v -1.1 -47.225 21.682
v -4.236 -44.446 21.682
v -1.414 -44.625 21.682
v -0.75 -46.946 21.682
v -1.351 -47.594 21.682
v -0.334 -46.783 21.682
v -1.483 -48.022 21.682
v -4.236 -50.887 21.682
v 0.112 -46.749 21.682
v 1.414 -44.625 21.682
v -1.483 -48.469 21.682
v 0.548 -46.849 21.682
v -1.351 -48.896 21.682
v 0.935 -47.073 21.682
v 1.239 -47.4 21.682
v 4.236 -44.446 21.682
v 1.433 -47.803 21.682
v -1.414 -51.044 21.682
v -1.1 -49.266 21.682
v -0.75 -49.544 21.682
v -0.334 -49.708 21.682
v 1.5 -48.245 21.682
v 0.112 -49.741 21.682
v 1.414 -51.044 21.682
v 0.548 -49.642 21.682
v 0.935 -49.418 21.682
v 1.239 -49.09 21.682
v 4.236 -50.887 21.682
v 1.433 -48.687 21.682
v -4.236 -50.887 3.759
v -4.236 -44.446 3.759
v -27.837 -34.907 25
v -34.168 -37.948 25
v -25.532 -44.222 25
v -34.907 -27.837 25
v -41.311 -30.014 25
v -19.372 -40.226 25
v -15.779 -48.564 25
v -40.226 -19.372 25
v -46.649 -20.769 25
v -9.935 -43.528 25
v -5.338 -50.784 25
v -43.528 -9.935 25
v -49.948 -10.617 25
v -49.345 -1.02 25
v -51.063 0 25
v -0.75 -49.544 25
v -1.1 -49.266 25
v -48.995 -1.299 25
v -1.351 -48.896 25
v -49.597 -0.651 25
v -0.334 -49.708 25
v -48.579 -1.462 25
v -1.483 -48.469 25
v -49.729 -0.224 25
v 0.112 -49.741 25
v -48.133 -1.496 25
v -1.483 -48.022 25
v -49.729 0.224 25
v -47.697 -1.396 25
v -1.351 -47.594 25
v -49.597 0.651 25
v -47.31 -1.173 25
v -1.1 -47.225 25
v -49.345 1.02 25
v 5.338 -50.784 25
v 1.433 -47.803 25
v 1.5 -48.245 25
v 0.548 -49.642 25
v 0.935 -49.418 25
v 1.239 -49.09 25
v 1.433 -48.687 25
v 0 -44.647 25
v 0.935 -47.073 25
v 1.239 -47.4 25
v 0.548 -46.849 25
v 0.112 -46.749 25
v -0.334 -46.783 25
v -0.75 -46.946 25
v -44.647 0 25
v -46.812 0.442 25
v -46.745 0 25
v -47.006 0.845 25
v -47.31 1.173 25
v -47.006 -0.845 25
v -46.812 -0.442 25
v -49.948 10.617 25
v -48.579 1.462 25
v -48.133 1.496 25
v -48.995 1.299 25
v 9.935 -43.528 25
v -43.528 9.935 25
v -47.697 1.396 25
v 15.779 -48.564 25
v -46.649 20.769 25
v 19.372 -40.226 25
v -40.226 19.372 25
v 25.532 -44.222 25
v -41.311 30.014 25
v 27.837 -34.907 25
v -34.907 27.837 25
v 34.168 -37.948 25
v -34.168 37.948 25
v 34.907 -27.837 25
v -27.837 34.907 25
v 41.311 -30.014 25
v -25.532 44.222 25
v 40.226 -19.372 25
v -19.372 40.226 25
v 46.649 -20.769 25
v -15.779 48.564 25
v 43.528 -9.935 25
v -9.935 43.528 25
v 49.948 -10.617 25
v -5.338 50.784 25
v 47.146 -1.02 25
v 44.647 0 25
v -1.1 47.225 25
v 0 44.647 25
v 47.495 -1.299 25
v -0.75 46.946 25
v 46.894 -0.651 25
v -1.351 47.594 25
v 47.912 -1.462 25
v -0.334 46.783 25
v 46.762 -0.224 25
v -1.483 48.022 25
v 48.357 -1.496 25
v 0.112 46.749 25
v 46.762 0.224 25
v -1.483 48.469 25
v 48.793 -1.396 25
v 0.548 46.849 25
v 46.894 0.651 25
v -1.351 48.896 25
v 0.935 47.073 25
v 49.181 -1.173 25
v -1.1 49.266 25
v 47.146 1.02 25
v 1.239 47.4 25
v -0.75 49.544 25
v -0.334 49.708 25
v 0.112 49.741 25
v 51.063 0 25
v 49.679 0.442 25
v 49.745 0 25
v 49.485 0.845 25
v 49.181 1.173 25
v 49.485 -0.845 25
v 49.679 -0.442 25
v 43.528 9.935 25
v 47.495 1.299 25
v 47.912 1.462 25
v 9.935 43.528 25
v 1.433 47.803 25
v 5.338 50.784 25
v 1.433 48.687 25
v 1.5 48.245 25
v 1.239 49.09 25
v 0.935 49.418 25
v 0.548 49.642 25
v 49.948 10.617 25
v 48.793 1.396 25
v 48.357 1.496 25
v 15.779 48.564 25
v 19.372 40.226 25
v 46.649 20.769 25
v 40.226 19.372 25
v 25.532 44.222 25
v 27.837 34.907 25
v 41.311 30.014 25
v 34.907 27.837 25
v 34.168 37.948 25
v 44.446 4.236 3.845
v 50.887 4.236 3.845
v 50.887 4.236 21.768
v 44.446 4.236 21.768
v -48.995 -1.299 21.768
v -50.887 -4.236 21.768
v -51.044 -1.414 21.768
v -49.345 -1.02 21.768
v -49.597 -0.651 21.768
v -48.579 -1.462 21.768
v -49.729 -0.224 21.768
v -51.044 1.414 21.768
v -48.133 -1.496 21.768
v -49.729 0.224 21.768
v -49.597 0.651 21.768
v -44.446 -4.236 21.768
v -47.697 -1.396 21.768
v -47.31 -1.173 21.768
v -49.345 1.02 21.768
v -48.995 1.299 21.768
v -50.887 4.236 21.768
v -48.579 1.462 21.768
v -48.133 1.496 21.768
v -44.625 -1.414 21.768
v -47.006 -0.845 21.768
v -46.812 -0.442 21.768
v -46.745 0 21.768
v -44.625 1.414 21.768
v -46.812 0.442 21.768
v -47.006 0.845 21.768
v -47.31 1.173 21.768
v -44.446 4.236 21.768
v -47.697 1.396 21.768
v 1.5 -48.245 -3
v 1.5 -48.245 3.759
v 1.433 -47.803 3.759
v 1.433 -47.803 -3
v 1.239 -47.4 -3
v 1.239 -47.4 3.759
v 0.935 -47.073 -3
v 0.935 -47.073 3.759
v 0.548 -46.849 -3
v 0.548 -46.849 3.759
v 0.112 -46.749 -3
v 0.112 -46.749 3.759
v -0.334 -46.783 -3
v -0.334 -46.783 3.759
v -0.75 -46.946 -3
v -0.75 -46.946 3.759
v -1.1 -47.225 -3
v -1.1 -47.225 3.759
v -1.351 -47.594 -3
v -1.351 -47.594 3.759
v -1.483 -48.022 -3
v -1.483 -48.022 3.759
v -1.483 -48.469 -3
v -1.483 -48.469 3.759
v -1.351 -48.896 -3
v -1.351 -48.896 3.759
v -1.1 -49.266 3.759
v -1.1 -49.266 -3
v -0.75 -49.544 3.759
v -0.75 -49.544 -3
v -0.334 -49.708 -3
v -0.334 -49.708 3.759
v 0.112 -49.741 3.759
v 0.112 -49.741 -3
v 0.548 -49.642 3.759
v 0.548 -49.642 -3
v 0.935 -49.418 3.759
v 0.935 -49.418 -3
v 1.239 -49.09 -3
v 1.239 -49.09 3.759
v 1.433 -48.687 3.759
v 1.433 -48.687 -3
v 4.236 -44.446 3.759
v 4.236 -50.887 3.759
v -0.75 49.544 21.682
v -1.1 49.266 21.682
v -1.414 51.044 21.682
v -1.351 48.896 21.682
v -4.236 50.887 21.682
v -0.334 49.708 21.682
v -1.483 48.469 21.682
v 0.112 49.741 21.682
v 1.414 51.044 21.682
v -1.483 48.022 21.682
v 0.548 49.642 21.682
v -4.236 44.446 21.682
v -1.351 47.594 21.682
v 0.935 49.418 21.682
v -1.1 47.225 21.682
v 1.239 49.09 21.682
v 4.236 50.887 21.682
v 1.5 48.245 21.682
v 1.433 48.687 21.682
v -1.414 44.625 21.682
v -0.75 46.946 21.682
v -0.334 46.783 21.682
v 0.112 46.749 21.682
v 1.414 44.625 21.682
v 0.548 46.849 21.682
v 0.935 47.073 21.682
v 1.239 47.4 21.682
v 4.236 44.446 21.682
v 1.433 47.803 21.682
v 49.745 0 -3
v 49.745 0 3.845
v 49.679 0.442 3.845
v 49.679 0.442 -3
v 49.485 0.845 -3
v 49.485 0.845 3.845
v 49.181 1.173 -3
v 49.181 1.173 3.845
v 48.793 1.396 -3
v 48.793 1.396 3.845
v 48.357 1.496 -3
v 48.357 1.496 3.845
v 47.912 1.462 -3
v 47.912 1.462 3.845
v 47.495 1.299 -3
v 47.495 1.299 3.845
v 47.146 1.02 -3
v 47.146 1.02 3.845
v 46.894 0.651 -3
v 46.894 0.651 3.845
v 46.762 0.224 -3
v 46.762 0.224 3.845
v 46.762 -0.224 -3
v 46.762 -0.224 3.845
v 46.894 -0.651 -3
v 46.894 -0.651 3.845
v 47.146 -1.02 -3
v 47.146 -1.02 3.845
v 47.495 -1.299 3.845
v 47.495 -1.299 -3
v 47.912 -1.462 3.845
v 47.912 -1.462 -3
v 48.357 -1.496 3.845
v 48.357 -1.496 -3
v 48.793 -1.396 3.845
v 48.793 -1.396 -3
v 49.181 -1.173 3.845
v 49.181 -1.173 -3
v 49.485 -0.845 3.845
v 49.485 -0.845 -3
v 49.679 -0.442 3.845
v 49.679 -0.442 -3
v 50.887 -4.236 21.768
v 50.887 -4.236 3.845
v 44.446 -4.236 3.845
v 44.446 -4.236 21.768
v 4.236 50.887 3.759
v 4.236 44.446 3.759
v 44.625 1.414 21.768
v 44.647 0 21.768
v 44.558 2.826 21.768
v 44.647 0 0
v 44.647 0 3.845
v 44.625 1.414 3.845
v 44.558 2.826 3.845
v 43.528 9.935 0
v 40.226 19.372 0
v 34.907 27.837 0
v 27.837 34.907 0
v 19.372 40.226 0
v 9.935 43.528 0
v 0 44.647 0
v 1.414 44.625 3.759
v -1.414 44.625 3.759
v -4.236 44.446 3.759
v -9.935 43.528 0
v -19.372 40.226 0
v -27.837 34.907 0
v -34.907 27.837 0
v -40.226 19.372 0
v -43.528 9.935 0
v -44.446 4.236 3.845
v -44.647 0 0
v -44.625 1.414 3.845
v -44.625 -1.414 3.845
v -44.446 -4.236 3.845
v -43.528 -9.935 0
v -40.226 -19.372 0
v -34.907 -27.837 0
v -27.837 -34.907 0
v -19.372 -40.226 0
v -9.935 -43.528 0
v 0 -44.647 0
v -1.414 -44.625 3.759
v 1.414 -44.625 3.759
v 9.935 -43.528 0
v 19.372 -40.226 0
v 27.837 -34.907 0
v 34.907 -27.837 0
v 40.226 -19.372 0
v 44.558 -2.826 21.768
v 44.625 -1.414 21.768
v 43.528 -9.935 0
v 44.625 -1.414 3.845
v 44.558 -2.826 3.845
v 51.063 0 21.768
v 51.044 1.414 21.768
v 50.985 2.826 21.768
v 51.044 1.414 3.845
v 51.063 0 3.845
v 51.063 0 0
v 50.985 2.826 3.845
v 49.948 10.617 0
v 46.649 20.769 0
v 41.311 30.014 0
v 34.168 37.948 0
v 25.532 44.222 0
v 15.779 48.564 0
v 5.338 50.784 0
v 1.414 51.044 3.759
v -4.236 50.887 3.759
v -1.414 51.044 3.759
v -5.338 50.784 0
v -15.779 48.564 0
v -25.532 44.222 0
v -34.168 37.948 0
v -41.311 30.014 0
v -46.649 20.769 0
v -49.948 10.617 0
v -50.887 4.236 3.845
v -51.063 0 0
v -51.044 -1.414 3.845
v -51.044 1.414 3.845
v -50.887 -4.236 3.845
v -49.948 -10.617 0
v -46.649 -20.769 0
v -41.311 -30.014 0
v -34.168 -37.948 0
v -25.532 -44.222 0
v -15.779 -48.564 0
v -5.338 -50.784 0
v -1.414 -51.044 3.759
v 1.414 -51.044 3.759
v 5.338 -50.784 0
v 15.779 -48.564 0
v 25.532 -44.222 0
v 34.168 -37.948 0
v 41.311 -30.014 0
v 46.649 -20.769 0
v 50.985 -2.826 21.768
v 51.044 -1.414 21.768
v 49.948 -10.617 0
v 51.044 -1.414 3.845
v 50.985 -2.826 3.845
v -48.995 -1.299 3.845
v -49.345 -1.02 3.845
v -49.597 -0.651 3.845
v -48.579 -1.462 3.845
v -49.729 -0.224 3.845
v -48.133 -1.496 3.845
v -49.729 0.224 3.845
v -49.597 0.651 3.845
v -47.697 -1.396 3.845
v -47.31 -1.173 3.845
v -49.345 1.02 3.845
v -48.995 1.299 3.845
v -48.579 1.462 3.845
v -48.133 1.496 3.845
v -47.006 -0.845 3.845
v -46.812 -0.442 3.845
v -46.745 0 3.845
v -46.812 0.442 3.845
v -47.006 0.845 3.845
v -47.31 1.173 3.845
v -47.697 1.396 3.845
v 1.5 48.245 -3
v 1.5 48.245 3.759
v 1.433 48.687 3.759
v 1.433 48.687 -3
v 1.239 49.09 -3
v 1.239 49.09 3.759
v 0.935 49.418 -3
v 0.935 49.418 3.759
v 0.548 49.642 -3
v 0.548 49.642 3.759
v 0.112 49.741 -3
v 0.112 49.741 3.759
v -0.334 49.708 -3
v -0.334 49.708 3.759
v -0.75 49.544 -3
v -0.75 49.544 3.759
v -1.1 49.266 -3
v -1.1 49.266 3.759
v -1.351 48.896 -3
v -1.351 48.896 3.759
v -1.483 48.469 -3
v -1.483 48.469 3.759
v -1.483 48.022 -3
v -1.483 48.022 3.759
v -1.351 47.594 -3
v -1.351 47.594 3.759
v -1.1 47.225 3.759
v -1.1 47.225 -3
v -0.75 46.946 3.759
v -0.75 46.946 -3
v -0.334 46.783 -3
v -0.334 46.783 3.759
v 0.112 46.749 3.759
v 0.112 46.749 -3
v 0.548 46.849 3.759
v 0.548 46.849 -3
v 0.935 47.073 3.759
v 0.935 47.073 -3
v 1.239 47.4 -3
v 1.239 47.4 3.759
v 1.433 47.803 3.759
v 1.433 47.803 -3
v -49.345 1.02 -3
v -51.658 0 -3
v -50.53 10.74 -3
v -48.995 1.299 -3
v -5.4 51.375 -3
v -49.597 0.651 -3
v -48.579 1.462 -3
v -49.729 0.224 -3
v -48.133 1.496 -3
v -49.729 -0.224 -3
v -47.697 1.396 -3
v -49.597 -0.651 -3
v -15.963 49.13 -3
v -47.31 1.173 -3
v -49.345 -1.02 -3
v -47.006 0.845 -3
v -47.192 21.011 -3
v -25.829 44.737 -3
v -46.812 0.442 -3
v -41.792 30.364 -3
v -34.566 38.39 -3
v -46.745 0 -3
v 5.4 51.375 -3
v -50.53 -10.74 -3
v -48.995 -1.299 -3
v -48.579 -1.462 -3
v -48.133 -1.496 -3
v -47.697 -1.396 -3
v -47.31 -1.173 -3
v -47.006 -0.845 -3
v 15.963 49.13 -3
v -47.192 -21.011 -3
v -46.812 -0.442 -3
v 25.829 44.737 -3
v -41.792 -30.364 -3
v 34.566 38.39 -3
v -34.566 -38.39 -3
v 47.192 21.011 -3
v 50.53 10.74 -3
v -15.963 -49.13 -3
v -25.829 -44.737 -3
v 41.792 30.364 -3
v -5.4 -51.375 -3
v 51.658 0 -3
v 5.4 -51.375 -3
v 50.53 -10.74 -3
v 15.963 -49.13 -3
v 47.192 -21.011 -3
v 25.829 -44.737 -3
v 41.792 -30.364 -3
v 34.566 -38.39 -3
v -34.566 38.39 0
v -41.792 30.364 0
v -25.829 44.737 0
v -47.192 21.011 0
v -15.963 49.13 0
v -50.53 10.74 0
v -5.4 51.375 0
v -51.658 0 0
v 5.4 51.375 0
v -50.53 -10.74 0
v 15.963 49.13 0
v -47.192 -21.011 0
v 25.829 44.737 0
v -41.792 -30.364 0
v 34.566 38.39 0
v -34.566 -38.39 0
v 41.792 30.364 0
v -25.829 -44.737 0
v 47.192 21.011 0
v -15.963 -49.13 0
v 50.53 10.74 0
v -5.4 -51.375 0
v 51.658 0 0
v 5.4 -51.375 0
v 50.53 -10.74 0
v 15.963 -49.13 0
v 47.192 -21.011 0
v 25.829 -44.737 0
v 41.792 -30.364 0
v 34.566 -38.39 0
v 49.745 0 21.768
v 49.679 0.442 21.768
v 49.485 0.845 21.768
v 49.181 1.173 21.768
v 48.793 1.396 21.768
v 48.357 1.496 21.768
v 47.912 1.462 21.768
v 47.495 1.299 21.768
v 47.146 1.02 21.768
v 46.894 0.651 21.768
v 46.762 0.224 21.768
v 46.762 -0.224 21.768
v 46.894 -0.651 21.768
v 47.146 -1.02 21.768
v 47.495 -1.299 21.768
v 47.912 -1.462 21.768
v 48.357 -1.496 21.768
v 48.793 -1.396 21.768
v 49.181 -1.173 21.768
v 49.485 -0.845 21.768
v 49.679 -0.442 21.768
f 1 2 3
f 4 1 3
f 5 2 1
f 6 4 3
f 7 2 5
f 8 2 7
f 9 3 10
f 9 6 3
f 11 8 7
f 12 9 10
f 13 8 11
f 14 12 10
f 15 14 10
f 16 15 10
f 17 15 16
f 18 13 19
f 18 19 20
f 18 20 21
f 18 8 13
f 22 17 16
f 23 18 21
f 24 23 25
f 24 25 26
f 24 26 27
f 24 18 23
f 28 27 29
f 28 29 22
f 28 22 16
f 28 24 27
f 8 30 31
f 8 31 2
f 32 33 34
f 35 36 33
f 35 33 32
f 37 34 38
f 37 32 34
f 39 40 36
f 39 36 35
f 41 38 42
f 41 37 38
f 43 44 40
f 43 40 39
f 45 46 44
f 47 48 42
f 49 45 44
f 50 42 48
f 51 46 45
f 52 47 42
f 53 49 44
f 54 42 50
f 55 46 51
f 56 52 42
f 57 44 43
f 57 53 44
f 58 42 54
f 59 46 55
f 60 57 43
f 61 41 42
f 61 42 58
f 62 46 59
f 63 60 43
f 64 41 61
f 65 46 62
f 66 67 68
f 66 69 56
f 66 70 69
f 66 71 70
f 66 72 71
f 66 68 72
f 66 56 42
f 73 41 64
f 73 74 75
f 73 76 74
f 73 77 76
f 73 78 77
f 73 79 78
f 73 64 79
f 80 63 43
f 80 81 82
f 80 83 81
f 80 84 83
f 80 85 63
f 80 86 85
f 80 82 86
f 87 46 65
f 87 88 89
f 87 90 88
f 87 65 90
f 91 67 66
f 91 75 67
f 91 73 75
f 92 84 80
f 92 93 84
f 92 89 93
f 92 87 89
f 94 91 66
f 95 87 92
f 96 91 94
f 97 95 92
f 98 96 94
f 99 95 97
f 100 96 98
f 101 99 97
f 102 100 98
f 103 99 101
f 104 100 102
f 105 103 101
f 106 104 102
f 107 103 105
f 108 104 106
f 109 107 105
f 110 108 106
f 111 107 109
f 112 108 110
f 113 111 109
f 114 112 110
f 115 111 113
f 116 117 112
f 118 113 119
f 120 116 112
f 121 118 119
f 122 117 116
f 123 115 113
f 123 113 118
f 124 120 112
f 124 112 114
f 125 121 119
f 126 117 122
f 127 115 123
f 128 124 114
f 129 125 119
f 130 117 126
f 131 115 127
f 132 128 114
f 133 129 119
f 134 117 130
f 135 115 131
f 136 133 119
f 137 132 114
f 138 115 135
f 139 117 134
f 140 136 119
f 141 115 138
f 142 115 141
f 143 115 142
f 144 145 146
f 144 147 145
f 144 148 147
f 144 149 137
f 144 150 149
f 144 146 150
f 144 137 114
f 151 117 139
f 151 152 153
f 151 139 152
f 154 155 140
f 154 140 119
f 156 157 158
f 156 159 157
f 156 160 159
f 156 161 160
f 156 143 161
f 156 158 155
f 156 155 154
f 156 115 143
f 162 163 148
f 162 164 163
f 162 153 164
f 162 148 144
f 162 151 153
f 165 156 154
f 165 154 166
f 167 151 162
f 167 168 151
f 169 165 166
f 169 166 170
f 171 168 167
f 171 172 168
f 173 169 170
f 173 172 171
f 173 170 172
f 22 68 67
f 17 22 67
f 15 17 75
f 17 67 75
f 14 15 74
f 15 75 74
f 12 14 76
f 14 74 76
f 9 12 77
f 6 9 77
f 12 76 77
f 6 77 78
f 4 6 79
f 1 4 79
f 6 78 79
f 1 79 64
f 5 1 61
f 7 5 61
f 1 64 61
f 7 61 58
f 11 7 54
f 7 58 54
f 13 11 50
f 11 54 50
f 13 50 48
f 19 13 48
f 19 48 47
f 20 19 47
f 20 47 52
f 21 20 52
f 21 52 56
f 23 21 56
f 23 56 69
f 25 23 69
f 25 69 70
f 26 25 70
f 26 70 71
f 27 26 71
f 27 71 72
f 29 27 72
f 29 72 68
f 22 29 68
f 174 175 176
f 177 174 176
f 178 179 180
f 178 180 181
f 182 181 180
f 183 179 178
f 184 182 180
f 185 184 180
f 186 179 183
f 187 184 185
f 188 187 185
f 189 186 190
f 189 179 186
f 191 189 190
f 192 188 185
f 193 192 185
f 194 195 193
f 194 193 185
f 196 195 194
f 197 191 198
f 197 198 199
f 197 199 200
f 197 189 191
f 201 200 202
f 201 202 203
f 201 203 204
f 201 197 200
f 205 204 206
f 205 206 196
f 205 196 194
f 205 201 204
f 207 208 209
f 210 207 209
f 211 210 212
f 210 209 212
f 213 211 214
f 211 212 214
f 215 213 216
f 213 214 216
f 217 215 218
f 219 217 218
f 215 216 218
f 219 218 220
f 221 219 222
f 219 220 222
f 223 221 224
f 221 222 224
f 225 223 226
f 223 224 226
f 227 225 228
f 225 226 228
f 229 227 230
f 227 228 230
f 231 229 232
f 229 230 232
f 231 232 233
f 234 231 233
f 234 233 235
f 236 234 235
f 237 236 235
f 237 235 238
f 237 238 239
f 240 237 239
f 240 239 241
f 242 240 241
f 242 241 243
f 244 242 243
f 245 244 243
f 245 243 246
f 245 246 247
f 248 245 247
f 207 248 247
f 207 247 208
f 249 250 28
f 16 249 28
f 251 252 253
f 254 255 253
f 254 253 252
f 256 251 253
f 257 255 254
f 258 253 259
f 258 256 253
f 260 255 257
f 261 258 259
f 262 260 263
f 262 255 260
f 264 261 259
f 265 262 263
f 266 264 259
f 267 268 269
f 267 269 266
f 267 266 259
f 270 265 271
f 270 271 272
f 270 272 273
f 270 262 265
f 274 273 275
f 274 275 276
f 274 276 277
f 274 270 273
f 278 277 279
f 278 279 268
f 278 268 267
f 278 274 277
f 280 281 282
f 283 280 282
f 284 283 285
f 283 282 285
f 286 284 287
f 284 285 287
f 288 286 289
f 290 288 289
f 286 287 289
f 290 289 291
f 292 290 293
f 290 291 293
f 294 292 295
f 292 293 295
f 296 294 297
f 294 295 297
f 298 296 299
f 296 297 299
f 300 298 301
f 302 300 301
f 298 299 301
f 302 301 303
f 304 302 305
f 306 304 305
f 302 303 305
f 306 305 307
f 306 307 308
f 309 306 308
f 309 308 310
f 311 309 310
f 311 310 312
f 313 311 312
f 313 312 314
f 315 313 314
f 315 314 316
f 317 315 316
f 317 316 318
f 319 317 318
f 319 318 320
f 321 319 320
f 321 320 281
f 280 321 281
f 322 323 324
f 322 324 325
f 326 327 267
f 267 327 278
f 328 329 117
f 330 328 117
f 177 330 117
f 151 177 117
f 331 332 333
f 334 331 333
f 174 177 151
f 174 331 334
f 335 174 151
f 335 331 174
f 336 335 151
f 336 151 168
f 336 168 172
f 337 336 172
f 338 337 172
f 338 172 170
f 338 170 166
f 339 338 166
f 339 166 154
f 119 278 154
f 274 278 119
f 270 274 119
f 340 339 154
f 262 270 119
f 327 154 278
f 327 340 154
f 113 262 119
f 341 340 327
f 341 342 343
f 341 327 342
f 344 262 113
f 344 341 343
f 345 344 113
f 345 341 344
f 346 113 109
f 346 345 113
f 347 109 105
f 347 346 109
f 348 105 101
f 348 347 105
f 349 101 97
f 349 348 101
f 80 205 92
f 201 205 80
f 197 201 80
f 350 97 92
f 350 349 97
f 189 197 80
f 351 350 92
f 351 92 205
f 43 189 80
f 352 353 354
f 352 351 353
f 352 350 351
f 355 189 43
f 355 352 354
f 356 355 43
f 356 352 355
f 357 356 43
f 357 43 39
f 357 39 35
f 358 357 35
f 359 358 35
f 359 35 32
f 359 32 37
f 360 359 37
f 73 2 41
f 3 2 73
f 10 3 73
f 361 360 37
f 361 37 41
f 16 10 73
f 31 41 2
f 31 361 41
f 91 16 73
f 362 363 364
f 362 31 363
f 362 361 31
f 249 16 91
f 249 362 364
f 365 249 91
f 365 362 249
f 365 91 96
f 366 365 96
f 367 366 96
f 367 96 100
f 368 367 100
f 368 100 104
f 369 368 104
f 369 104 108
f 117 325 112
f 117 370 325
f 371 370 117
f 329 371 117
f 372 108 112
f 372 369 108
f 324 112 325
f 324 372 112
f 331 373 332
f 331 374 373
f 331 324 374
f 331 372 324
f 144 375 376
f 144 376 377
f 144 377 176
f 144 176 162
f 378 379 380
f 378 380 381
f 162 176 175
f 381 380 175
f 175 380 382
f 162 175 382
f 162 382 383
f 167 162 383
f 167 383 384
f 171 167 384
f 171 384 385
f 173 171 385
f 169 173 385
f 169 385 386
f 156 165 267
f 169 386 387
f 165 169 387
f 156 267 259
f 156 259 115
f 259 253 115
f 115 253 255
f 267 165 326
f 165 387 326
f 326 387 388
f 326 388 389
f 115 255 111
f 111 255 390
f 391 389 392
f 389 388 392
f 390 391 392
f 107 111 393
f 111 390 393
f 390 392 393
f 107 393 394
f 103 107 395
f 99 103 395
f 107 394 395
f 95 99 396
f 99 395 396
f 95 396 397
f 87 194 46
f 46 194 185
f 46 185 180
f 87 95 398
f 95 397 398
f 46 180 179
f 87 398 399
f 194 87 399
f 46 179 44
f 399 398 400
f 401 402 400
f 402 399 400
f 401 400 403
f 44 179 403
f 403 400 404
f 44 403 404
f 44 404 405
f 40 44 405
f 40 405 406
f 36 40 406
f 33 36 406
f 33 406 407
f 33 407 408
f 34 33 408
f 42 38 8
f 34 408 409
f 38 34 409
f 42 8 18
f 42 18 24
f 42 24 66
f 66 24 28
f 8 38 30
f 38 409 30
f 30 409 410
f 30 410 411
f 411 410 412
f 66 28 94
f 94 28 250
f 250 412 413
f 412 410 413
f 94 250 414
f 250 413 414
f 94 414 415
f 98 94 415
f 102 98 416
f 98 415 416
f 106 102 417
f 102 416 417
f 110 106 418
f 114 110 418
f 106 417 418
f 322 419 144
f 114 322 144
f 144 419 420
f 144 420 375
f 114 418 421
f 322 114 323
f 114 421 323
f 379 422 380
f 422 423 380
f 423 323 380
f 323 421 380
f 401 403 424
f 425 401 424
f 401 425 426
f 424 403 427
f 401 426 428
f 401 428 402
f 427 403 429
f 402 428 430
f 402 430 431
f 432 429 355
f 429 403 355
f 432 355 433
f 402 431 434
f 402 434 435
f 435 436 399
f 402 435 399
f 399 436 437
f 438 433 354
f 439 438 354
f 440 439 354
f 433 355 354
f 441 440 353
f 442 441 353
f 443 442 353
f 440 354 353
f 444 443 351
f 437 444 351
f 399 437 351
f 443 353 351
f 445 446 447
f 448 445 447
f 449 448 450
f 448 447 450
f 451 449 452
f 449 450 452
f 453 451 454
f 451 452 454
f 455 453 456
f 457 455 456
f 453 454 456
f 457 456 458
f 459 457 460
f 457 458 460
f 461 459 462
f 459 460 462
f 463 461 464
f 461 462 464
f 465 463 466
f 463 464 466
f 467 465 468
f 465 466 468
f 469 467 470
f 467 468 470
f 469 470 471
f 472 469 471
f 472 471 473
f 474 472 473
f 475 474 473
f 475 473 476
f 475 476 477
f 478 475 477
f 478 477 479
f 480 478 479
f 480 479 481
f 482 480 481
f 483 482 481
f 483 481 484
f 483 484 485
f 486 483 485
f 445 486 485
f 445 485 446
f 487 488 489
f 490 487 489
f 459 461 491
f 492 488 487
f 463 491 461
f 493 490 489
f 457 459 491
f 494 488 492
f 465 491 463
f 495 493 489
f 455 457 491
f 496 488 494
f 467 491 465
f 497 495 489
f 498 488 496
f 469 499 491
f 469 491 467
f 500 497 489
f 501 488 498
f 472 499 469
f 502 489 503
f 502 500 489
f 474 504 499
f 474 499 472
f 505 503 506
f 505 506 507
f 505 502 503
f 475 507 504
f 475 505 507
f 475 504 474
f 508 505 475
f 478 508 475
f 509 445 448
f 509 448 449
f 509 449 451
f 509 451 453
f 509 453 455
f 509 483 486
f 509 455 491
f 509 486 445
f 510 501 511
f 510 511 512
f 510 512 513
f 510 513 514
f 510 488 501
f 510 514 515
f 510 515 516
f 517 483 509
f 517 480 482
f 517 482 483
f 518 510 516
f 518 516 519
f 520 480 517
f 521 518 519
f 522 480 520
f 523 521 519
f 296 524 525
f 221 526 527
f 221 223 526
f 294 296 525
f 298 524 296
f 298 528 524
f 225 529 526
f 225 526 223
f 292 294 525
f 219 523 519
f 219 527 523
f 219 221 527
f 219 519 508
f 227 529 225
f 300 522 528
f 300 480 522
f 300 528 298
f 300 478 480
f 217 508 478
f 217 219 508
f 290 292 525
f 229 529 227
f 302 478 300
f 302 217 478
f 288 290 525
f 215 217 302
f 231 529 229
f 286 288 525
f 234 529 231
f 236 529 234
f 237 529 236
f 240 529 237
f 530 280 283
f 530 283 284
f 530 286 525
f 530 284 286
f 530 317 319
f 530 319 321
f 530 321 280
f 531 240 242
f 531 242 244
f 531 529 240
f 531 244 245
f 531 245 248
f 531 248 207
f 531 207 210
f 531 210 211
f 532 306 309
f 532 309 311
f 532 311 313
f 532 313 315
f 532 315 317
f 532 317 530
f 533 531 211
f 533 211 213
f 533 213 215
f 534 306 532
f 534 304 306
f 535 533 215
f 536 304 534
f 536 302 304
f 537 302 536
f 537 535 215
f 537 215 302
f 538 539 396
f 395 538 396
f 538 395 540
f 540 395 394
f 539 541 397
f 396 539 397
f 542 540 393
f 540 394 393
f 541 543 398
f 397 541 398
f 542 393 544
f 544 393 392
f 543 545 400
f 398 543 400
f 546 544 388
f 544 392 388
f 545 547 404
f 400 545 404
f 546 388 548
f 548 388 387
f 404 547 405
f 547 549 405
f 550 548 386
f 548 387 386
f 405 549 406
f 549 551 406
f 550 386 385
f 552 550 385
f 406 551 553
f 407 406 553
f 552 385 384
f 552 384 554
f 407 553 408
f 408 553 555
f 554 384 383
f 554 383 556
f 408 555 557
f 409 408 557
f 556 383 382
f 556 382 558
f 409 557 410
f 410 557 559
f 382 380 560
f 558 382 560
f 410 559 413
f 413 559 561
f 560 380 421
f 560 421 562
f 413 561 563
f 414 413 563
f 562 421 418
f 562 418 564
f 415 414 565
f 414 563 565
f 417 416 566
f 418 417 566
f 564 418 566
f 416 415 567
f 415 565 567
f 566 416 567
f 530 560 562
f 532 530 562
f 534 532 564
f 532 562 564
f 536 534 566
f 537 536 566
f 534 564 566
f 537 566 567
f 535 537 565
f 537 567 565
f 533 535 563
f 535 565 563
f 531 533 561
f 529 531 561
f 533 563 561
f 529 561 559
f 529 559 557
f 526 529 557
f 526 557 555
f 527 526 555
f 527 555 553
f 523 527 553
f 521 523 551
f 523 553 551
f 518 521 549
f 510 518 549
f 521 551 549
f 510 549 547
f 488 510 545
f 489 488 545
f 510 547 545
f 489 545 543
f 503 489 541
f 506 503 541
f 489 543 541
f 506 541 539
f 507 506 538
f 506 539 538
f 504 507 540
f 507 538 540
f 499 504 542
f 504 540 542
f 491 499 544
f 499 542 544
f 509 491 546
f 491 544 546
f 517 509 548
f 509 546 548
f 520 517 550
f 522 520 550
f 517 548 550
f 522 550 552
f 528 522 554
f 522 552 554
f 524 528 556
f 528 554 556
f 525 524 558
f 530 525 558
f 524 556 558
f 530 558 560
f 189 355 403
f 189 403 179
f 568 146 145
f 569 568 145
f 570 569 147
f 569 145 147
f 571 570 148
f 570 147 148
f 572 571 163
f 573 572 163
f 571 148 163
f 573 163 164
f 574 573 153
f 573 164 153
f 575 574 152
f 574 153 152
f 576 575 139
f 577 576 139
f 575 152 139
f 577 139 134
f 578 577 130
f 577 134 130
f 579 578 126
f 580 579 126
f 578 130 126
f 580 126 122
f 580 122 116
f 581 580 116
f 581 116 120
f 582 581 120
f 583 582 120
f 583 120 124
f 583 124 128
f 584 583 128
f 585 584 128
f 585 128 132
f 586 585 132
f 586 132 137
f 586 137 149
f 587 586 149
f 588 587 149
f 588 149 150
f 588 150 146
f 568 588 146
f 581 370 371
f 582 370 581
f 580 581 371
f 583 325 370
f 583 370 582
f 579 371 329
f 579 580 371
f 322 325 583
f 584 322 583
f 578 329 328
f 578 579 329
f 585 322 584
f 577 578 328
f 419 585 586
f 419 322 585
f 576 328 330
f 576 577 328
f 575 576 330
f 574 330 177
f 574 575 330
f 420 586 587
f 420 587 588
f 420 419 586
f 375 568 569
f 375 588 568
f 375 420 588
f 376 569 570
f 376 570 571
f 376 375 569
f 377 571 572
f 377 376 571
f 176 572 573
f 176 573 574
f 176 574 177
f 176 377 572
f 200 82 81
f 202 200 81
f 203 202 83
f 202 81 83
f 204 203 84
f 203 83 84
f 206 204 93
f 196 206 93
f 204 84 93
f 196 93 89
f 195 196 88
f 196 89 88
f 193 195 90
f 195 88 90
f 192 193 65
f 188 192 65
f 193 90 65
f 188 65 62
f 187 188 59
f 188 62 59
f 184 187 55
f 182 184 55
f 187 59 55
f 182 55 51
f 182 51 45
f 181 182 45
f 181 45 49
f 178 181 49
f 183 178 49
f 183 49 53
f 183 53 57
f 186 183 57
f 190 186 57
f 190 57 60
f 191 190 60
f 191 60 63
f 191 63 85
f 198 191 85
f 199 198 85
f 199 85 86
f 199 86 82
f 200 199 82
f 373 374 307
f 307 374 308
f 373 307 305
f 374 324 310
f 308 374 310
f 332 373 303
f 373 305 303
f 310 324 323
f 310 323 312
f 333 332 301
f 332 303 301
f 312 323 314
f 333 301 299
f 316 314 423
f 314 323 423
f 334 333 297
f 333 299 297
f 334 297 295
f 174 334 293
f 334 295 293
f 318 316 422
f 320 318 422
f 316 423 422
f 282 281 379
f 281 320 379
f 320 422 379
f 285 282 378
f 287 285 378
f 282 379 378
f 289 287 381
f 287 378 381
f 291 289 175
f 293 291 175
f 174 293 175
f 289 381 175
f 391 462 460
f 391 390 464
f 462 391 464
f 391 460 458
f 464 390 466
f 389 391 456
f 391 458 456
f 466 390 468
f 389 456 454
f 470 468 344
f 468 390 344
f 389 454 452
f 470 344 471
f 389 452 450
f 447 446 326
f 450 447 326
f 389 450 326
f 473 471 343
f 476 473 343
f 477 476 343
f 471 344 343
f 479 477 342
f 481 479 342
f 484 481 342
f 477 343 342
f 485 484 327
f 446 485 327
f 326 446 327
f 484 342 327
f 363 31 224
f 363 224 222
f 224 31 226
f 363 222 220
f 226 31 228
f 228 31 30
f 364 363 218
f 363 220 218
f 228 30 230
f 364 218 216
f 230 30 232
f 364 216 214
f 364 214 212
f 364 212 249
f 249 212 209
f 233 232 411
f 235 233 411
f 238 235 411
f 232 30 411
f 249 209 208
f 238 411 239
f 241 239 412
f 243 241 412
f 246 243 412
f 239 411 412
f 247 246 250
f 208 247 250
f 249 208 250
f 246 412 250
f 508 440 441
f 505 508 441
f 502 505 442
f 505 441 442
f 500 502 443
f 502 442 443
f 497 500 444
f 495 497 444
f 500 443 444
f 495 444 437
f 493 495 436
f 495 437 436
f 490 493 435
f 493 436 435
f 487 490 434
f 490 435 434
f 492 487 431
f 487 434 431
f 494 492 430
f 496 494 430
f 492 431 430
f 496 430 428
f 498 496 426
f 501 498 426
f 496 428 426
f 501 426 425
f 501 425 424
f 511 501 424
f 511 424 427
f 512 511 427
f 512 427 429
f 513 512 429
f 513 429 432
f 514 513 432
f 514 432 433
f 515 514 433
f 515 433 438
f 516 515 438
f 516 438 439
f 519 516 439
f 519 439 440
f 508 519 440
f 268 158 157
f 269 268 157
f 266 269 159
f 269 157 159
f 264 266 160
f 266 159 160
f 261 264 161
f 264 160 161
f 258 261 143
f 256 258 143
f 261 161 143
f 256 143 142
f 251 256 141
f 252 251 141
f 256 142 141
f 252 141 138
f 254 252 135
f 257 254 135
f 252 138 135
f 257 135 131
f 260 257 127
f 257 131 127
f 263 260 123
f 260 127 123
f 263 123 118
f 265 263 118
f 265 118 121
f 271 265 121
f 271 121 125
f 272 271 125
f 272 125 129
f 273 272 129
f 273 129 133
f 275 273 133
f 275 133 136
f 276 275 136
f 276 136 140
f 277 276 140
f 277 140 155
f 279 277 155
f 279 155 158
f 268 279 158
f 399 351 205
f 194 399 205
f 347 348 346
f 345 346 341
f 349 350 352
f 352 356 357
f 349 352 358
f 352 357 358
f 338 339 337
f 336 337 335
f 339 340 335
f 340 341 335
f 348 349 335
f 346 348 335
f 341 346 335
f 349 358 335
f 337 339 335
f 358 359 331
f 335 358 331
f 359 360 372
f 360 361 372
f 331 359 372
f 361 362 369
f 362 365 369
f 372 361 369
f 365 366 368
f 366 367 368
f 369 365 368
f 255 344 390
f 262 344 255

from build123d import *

# Parameters (mm, degrees)
F0_R     = 51.0634311227
F0_R_2   = 44.6472785168
F1_DEPTH = 25
F2_R     = 51.658363485
F3_DEPTH = 3
F4_W     = 8.4723439068
F4_H     = 17.9225206375
F5_DEPTH = 87.2
F6_W     = 8.4723439068
F6_H     = 17.9225206375
F7_DEPTH = 61.9
F8_R     = 1.5
F9_DEPTH = 28.001


with BuildPart() as f1:
    # F0 (on Top) → F1 (new body)
    with BuildSketch(Plane.XY):
        Circle(F0_R)
        Circle(F0_R_2, mode=Mode.SUBTRACT)
    extrude(amount=F1_DEPTH)

    # F2 (on face) → F3 (join)
    with BuildSketch(Plane(origin=(0, 0, 0), x_dir=(1, 0, 0), z_dir=(0, 0, -1))):
        Circle(F2_R)
    extrude(amount=F3_DEPTH)

    # F4 (on Front) → F5 (cut, symmetric)
    with BuildSketch(Plane.XZ):
        with Locations((0, 12.7205625176)):
            Rectangle(F4_W, F4_H)
    extrude(amount=F5_DEPTH, both=True, mode=Mode.SUBTRACT)

    # F6 (on Right) → F7 (cut, symmetric)
    with BuildSketch(Plane.YZ):
        with Locations((0, 12.8065040335)):
            Rectangle(F6_W, F6_H)
    extrude(amount=F7_DEPTH, both=True, mode=Mode.SUBTRACT)

    # F8 (on face) → F9 (cut, through all)
    with BuildSketch(Plane.XY.offset(25)):
        with Locations((0, 48.2453033328)):
            Circle(F8_R)
        with Locations((0, -48.2453033328)):
            Circle(F8_R)
        with Locations((-48.2453033328, 0)):
            Circle(F8_R)
        with Locations((48.2453033328, 0)):
            Circle(F8_R)
    extrude(amount=-F9_DEPTH, mode=Mode.SUBTRACT)


solid = f1.part
